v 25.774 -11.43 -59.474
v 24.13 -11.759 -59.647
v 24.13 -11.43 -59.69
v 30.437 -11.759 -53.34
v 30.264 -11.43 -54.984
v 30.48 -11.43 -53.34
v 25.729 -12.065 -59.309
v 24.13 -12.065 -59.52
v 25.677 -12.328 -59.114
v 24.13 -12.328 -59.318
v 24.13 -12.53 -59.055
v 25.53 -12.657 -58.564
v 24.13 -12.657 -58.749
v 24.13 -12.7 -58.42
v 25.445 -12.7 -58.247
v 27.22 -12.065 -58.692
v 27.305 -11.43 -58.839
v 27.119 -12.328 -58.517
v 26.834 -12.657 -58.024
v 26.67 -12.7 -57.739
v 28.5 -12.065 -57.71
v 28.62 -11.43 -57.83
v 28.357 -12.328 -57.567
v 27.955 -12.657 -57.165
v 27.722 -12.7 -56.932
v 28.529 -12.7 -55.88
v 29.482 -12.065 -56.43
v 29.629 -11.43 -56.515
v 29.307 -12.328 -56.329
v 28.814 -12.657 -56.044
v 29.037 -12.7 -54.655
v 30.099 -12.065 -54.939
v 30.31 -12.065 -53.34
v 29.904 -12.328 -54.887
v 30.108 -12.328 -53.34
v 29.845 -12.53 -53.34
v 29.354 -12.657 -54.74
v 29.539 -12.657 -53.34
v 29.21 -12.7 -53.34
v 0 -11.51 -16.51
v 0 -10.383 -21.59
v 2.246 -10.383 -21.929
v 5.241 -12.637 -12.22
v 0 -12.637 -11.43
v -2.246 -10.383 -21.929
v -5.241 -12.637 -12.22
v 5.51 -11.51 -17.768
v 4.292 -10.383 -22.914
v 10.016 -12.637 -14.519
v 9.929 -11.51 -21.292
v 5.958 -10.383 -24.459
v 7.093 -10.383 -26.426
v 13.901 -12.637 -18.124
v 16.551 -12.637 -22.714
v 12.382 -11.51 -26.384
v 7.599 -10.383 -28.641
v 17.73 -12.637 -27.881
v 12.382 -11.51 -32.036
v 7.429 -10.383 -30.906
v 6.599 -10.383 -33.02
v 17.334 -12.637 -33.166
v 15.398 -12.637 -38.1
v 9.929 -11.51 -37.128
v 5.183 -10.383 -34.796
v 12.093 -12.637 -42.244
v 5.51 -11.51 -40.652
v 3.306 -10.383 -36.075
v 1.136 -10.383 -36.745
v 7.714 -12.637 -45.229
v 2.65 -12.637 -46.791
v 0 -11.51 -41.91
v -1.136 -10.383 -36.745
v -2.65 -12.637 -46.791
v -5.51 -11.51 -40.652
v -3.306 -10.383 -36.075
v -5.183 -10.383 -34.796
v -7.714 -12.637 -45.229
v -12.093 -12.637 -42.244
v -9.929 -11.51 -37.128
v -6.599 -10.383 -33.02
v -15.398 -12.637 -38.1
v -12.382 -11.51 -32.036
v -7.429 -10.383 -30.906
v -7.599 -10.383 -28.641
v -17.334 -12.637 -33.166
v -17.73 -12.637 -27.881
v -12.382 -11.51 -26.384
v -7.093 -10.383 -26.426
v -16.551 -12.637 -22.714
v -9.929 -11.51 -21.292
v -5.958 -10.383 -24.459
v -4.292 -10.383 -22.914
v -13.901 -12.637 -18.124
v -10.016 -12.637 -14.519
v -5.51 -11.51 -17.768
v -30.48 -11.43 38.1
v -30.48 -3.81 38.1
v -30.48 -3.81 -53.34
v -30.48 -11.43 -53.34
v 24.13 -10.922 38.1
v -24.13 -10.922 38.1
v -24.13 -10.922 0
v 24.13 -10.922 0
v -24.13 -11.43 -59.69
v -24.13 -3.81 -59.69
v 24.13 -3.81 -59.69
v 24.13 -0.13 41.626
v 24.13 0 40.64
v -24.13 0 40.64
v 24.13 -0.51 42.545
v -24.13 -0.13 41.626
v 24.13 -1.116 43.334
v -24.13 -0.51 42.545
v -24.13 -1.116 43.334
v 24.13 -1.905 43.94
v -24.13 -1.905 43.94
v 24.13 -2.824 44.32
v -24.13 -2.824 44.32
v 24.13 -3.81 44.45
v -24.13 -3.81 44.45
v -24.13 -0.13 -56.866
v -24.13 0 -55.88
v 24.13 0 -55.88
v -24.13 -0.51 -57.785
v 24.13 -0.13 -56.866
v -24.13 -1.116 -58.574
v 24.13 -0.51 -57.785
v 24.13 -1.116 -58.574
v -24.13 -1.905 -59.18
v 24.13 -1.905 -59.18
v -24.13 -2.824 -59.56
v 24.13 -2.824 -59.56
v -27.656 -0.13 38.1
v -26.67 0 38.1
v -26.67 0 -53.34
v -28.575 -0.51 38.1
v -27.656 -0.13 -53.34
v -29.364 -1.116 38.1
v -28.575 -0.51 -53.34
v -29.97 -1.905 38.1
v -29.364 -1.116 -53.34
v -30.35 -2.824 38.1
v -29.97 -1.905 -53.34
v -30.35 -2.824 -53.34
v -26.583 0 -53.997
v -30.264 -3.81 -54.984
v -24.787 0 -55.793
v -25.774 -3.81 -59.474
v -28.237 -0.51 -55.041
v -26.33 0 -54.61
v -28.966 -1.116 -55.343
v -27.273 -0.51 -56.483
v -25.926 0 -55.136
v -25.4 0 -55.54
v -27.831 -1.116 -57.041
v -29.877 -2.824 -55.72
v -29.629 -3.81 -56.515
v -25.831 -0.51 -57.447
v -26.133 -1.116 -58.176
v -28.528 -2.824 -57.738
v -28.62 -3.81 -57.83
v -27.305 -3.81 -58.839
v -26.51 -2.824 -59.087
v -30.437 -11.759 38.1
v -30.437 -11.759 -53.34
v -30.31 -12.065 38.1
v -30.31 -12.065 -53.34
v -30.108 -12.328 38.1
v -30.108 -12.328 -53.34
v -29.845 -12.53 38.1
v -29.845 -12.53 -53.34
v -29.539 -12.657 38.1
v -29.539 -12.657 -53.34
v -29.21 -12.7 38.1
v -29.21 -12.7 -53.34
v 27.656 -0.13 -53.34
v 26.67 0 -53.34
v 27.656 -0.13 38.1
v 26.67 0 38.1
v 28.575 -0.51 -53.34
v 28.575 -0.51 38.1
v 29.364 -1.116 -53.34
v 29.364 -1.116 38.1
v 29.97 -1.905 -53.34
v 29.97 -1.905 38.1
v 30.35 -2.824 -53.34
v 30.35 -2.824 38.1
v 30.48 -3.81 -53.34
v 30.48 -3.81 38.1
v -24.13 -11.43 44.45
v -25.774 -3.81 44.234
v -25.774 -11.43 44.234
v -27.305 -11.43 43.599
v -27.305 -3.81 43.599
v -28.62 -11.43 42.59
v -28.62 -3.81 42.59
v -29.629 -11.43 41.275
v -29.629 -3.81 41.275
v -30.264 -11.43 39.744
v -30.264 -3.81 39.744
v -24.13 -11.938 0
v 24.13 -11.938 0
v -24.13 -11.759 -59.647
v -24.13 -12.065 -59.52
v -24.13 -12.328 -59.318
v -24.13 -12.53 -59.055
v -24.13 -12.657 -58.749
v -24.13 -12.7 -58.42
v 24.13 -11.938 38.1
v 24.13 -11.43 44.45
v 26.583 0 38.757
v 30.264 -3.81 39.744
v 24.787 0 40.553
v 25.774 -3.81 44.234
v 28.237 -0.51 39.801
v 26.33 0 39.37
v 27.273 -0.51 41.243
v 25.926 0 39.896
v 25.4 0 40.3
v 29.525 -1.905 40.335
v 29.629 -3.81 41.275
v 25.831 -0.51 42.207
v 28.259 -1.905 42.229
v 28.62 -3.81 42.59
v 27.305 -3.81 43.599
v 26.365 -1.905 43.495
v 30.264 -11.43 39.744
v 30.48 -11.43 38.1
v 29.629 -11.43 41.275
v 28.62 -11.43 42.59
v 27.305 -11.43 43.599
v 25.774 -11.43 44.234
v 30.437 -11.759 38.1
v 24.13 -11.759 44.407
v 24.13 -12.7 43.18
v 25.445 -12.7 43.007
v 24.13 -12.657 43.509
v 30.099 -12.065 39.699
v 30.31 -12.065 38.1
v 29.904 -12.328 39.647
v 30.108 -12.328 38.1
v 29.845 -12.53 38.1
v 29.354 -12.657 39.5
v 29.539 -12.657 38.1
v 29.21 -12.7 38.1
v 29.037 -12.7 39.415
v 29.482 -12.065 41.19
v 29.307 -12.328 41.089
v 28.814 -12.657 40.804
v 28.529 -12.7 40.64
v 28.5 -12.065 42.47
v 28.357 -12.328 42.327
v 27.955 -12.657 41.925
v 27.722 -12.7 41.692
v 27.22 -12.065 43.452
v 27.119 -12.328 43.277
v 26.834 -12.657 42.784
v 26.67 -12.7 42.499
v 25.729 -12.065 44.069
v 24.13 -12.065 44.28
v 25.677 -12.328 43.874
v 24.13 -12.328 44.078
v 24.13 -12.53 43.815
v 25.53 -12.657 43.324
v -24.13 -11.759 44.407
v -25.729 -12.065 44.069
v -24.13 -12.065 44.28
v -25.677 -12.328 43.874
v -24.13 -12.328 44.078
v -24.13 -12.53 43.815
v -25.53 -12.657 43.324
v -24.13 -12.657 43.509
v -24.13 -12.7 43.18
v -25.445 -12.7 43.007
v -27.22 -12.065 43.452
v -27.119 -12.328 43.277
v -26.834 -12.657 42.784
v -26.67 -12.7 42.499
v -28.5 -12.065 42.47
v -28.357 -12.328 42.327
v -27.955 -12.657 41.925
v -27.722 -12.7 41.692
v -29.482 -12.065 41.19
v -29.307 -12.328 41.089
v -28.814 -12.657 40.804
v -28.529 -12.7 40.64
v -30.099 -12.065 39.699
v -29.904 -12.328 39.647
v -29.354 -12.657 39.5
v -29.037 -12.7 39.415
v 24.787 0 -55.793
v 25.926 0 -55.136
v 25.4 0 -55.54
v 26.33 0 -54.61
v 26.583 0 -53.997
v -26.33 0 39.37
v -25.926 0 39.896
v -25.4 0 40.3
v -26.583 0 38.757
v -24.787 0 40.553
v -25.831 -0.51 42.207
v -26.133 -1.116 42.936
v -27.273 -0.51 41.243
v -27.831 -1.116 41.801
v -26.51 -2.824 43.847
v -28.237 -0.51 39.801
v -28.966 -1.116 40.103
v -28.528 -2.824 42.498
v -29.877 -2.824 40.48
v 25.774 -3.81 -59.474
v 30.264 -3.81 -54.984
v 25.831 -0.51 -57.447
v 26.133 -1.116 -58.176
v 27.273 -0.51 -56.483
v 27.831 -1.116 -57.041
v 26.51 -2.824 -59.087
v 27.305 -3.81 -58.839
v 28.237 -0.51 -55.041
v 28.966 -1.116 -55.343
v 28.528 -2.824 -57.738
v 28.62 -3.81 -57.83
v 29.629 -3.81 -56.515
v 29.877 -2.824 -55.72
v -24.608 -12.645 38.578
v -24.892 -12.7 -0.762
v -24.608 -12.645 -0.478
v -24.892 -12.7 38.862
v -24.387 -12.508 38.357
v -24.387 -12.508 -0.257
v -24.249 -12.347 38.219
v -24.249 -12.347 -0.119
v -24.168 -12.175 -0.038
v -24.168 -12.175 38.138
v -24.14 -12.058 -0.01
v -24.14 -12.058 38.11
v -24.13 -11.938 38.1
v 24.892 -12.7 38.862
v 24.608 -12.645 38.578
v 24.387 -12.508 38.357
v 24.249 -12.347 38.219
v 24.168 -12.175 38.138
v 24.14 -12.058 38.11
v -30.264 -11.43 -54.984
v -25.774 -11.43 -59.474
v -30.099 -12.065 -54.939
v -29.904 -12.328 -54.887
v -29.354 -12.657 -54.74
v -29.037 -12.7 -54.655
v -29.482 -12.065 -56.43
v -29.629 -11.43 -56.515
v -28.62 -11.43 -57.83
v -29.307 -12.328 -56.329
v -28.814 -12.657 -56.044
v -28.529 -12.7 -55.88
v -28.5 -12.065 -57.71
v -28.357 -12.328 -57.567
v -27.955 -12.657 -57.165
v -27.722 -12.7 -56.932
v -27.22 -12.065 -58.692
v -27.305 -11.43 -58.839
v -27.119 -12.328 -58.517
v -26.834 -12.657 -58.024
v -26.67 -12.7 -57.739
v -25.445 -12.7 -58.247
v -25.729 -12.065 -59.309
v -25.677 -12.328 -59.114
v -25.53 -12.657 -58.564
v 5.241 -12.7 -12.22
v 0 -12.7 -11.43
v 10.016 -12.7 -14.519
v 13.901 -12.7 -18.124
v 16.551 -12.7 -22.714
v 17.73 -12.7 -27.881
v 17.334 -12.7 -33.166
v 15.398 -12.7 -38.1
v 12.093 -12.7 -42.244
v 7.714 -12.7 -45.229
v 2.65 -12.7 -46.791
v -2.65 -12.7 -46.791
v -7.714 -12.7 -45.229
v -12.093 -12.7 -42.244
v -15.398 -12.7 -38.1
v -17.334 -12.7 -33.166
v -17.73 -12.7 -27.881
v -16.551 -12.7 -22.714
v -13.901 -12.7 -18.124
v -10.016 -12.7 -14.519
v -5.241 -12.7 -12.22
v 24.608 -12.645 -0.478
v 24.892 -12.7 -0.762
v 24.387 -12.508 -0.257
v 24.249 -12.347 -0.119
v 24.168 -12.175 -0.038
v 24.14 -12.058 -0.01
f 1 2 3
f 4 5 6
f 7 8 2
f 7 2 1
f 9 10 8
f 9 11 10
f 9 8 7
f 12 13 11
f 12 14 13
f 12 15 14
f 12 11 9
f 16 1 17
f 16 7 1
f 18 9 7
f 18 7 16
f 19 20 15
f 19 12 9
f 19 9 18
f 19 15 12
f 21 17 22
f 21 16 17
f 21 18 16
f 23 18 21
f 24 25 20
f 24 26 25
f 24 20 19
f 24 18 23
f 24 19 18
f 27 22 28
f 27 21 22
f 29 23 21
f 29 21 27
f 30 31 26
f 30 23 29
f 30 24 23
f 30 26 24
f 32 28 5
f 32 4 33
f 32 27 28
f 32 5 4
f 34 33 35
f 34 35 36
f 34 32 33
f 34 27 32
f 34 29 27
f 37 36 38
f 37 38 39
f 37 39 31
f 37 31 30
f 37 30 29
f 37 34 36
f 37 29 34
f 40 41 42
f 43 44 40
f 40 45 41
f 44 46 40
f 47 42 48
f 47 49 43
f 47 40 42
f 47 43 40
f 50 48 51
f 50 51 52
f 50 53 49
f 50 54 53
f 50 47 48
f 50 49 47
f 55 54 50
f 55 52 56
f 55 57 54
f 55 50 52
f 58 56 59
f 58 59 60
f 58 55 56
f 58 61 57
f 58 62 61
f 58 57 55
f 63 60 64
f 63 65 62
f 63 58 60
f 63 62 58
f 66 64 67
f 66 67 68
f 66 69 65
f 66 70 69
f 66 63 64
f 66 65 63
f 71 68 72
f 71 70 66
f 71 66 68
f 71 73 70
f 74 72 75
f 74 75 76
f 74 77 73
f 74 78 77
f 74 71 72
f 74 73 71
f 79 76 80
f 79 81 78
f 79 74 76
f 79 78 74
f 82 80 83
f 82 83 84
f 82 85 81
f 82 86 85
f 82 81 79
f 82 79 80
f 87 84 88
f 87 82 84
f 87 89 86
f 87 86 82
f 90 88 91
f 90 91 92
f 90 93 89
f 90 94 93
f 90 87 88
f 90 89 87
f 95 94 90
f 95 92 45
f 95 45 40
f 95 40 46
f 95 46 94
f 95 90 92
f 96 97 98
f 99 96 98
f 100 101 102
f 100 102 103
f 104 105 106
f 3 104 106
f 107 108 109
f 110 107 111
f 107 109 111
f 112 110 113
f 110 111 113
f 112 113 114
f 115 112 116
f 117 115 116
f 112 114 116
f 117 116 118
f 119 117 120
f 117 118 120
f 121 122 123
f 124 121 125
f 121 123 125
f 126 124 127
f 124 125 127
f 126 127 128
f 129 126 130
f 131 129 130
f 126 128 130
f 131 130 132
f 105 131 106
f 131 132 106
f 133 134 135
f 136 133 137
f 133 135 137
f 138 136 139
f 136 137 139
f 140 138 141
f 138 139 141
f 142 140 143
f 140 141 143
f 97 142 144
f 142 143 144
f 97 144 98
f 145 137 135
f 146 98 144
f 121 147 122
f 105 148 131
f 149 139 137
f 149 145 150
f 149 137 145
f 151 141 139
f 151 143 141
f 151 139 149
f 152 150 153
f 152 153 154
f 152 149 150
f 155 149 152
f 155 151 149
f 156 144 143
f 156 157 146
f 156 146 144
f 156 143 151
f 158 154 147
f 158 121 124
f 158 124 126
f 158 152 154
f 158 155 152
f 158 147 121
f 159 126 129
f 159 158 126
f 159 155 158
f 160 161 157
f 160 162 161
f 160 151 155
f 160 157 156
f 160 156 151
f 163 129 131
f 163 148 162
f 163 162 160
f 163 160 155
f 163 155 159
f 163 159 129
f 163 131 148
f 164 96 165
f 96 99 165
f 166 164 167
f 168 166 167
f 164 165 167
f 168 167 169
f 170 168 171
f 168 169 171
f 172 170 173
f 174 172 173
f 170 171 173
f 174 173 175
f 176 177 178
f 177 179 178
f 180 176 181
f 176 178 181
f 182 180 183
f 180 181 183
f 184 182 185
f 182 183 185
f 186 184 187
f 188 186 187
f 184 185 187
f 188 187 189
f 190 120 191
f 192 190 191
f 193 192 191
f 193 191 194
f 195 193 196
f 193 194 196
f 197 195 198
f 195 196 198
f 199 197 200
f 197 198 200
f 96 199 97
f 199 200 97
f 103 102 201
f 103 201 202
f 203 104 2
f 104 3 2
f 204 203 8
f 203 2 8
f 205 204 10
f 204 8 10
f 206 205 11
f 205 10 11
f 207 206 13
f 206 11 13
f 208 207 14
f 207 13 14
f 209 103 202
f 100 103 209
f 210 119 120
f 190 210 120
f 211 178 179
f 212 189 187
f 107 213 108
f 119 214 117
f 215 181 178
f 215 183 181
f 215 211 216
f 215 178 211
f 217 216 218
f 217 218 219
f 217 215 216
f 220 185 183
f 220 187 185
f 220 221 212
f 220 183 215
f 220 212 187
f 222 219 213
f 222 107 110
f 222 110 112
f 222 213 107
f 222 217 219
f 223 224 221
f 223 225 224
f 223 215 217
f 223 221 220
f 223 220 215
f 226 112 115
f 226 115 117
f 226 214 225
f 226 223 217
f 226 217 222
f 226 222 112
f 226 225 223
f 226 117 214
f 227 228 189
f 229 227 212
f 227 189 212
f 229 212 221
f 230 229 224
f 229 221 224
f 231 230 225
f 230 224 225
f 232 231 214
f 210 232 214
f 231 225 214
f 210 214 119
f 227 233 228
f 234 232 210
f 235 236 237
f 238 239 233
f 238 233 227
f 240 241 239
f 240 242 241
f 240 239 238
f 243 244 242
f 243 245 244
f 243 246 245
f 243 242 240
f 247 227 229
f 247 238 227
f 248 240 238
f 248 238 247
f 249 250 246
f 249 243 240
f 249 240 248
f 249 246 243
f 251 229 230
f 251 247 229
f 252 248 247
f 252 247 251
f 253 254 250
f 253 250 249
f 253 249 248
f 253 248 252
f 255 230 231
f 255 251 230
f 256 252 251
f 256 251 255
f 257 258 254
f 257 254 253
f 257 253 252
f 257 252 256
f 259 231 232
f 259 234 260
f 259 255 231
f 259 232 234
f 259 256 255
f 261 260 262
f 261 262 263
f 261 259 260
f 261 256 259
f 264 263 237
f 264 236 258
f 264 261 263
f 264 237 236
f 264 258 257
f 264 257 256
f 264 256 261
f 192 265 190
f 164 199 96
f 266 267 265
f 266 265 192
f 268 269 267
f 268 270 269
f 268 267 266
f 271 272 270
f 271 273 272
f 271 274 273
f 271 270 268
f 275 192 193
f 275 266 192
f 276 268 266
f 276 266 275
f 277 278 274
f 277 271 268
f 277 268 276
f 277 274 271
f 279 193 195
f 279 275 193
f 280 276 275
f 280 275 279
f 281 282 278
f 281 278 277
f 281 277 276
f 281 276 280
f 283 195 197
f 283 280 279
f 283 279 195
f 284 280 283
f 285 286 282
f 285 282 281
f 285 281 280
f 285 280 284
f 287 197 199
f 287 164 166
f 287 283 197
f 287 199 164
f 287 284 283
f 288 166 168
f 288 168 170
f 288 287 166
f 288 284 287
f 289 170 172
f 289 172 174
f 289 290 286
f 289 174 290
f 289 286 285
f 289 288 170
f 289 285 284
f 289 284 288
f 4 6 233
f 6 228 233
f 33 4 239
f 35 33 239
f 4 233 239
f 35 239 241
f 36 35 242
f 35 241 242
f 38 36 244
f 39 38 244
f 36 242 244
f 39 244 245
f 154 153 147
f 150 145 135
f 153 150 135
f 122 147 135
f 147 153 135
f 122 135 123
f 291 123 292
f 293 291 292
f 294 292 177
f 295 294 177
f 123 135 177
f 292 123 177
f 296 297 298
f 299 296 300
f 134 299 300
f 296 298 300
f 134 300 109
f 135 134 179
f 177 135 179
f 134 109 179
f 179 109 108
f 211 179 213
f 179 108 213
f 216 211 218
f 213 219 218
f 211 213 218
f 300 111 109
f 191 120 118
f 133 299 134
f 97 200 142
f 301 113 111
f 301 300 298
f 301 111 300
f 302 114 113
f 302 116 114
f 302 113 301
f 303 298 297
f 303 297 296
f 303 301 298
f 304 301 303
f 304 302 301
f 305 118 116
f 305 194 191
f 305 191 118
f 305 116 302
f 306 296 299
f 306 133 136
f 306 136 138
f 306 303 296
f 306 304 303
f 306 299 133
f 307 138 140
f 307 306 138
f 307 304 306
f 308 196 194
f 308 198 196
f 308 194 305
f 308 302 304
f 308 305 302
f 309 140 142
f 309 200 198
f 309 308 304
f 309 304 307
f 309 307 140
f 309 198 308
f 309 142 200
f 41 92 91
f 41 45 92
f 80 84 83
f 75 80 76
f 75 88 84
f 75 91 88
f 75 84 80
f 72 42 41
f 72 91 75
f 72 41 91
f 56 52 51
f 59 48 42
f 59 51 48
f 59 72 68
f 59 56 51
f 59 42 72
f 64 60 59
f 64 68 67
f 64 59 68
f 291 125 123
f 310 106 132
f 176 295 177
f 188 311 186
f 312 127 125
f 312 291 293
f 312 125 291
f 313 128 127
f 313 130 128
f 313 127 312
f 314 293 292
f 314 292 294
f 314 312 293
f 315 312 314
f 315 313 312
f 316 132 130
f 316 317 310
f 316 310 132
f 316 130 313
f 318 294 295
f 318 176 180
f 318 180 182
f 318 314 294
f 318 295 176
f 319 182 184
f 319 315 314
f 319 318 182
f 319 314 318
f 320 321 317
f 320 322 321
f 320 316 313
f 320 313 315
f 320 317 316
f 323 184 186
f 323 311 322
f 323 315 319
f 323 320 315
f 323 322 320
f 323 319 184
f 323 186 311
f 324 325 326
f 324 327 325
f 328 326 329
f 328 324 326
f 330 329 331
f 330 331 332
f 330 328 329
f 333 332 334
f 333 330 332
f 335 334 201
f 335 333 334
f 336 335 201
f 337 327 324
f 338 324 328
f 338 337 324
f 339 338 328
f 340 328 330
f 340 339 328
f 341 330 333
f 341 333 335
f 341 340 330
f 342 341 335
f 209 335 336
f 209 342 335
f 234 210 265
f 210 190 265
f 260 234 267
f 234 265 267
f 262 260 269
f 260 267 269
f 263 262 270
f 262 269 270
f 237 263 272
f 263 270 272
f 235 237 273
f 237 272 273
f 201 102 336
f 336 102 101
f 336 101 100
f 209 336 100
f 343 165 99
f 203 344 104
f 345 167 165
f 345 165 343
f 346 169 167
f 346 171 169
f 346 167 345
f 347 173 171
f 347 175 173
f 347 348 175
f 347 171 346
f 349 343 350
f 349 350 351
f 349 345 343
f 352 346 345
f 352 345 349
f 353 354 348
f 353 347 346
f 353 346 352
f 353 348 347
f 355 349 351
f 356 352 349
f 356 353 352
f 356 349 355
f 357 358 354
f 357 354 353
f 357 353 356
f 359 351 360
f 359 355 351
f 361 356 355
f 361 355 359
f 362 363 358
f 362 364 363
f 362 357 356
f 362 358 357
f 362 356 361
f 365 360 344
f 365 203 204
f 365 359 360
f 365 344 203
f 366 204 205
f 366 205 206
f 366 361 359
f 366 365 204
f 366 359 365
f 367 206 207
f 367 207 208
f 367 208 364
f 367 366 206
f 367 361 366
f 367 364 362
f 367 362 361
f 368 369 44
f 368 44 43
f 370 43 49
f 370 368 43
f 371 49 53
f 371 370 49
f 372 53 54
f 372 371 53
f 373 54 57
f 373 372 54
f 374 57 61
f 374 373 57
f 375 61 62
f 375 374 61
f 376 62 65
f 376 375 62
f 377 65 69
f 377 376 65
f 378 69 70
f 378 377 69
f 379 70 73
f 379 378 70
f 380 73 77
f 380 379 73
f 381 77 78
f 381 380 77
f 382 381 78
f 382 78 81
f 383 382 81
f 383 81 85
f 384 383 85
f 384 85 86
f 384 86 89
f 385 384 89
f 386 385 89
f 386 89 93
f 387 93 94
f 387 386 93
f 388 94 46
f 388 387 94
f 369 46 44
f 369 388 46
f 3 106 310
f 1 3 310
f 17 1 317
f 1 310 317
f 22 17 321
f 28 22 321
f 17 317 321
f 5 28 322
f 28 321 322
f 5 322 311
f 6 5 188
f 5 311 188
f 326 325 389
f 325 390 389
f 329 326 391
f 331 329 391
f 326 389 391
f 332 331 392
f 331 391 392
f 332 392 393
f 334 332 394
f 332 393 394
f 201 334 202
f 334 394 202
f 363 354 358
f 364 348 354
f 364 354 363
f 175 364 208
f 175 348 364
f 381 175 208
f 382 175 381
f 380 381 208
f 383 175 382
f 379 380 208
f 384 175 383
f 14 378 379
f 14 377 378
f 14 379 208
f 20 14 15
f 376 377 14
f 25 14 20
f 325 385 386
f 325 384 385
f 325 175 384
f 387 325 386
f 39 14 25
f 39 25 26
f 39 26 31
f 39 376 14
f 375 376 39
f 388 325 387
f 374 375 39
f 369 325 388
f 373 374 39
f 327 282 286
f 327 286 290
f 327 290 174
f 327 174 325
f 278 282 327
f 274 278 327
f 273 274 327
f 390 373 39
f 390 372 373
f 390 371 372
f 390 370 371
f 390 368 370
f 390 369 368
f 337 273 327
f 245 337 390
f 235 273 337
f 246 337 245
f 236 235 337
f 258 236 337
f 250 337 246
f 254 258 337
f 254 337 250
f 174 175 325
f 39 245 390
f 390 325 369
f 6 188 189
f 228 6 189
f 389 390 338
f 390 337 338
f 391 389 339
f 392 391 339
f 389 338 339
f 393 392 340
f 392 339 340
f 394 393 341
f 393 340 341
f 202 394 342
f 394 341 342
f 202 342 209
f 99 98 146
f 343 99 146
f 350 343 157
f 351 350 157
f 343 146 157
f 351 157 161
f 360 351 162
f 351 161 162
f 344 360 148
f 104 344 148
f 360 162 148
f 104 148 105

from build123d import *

# Parameters (mm, degrees)
F0_R     = 17.78
F0_W     = 48.26
F0_H     = 38.1
F0_R_2   = 7.62
F1_DEPTH = 12.7
F5_W     = 48.26
F5_H     = 38.1
F6_DEPTH = 10.922
F7_R     = 3.81
F8_R     = 1.27
F9_R     = 0.762


with BuildPart() as f1:
    # F0 (on Front) → F1 (new body)
    with BuildSketch(Plane.XZ):
        with BuildLine():
            Line((24.13, 44.45), (-24.13, 44.45))
            ThreePointArc((-24.13, 44.45), (-28.620128, 42.590128), (-30.48, 38.1))
            Line((-30.48, 38.1), (-30.48, -53.34))
            ThreePointArc((-30.48, -53.34), (-28.620128, -57.830128), (-24.13, -59.69))
            Line((-24.13, -59.69), (24.13, -59.69))
            ThreePointArc((24.13, -59.69), (28.620128, -57.830128), (30.48, -53.34))
            Line((30.48, -53.34), (30.48, 38.1))
            ThreePointArc((30.48, 38.1), (28.620128, 42.590128), (24.13, 44.45))
        make_face()
        with Locations((0, -29.21)):
            Circle(F0_R, mode=Mode.SUBTRACT)
        with Locations((0, 19.05)):
            Rectangle(F0_W, F0_H, mode=Mode.SUBTRACT)
        with Locations((0, -29.21)):
            Circle(F0_R)
        with Locations((0, -29.21)):
            Circle(F0_R_2, mode=Mode.SUBTRACT)
        with Locations((0, -29.21)):
            Circle(F0_R_2)
    extrude(amount=F1_DEPTH)

    # F3 (on Right) → F4 (revolve, cut)
    with BuildSketch(Plane.YZ):
        Polygon((-16.624968, -29.21), (-10.382934, -29.21), (-10.382934, -21.59), (-12.636651, -11.43), (-16.624968, -11.43), align=None)
    revolve(axis=Axis((0, -8.021076, -29.21), (0, 1, 0)), mode=Mode.SUBTRACT)

    # F5 (on Front) → F6 (join)
    with BuildSketch(Plane.XZ):
        with Locations((0, 19.05)):
            Rectangle(F5_W, F5_H)
    extrude(amount=F6_DEPTH)

    # F7
    f7_edges = [f1.edges().sort_by_distance(p)[0] for p in [
        (28.620128, 0, 42.590128),
    ]]
    fillet(f7_edges, radius=F7_R)

    # F8
    f8_edges = [f1.edges().sort_by_distance(p)[0] for p in [
        (28.620128, -12.7, 42.590128),
    ]]
    fillet(f8_edges, radius=F8_R)

    # F9
    f9_edges = [f1.edges().sort_by_distance(p)[0] for p in [
        (0, -12.7, 0),
        (-24.13, -12.7, 19.05),
        (0, -12.7, 38.1),
        (24.13, -12.7, 19.05),
    ]]
    fillet(f9_edges, radius=F9_R)


solid = f1.part
